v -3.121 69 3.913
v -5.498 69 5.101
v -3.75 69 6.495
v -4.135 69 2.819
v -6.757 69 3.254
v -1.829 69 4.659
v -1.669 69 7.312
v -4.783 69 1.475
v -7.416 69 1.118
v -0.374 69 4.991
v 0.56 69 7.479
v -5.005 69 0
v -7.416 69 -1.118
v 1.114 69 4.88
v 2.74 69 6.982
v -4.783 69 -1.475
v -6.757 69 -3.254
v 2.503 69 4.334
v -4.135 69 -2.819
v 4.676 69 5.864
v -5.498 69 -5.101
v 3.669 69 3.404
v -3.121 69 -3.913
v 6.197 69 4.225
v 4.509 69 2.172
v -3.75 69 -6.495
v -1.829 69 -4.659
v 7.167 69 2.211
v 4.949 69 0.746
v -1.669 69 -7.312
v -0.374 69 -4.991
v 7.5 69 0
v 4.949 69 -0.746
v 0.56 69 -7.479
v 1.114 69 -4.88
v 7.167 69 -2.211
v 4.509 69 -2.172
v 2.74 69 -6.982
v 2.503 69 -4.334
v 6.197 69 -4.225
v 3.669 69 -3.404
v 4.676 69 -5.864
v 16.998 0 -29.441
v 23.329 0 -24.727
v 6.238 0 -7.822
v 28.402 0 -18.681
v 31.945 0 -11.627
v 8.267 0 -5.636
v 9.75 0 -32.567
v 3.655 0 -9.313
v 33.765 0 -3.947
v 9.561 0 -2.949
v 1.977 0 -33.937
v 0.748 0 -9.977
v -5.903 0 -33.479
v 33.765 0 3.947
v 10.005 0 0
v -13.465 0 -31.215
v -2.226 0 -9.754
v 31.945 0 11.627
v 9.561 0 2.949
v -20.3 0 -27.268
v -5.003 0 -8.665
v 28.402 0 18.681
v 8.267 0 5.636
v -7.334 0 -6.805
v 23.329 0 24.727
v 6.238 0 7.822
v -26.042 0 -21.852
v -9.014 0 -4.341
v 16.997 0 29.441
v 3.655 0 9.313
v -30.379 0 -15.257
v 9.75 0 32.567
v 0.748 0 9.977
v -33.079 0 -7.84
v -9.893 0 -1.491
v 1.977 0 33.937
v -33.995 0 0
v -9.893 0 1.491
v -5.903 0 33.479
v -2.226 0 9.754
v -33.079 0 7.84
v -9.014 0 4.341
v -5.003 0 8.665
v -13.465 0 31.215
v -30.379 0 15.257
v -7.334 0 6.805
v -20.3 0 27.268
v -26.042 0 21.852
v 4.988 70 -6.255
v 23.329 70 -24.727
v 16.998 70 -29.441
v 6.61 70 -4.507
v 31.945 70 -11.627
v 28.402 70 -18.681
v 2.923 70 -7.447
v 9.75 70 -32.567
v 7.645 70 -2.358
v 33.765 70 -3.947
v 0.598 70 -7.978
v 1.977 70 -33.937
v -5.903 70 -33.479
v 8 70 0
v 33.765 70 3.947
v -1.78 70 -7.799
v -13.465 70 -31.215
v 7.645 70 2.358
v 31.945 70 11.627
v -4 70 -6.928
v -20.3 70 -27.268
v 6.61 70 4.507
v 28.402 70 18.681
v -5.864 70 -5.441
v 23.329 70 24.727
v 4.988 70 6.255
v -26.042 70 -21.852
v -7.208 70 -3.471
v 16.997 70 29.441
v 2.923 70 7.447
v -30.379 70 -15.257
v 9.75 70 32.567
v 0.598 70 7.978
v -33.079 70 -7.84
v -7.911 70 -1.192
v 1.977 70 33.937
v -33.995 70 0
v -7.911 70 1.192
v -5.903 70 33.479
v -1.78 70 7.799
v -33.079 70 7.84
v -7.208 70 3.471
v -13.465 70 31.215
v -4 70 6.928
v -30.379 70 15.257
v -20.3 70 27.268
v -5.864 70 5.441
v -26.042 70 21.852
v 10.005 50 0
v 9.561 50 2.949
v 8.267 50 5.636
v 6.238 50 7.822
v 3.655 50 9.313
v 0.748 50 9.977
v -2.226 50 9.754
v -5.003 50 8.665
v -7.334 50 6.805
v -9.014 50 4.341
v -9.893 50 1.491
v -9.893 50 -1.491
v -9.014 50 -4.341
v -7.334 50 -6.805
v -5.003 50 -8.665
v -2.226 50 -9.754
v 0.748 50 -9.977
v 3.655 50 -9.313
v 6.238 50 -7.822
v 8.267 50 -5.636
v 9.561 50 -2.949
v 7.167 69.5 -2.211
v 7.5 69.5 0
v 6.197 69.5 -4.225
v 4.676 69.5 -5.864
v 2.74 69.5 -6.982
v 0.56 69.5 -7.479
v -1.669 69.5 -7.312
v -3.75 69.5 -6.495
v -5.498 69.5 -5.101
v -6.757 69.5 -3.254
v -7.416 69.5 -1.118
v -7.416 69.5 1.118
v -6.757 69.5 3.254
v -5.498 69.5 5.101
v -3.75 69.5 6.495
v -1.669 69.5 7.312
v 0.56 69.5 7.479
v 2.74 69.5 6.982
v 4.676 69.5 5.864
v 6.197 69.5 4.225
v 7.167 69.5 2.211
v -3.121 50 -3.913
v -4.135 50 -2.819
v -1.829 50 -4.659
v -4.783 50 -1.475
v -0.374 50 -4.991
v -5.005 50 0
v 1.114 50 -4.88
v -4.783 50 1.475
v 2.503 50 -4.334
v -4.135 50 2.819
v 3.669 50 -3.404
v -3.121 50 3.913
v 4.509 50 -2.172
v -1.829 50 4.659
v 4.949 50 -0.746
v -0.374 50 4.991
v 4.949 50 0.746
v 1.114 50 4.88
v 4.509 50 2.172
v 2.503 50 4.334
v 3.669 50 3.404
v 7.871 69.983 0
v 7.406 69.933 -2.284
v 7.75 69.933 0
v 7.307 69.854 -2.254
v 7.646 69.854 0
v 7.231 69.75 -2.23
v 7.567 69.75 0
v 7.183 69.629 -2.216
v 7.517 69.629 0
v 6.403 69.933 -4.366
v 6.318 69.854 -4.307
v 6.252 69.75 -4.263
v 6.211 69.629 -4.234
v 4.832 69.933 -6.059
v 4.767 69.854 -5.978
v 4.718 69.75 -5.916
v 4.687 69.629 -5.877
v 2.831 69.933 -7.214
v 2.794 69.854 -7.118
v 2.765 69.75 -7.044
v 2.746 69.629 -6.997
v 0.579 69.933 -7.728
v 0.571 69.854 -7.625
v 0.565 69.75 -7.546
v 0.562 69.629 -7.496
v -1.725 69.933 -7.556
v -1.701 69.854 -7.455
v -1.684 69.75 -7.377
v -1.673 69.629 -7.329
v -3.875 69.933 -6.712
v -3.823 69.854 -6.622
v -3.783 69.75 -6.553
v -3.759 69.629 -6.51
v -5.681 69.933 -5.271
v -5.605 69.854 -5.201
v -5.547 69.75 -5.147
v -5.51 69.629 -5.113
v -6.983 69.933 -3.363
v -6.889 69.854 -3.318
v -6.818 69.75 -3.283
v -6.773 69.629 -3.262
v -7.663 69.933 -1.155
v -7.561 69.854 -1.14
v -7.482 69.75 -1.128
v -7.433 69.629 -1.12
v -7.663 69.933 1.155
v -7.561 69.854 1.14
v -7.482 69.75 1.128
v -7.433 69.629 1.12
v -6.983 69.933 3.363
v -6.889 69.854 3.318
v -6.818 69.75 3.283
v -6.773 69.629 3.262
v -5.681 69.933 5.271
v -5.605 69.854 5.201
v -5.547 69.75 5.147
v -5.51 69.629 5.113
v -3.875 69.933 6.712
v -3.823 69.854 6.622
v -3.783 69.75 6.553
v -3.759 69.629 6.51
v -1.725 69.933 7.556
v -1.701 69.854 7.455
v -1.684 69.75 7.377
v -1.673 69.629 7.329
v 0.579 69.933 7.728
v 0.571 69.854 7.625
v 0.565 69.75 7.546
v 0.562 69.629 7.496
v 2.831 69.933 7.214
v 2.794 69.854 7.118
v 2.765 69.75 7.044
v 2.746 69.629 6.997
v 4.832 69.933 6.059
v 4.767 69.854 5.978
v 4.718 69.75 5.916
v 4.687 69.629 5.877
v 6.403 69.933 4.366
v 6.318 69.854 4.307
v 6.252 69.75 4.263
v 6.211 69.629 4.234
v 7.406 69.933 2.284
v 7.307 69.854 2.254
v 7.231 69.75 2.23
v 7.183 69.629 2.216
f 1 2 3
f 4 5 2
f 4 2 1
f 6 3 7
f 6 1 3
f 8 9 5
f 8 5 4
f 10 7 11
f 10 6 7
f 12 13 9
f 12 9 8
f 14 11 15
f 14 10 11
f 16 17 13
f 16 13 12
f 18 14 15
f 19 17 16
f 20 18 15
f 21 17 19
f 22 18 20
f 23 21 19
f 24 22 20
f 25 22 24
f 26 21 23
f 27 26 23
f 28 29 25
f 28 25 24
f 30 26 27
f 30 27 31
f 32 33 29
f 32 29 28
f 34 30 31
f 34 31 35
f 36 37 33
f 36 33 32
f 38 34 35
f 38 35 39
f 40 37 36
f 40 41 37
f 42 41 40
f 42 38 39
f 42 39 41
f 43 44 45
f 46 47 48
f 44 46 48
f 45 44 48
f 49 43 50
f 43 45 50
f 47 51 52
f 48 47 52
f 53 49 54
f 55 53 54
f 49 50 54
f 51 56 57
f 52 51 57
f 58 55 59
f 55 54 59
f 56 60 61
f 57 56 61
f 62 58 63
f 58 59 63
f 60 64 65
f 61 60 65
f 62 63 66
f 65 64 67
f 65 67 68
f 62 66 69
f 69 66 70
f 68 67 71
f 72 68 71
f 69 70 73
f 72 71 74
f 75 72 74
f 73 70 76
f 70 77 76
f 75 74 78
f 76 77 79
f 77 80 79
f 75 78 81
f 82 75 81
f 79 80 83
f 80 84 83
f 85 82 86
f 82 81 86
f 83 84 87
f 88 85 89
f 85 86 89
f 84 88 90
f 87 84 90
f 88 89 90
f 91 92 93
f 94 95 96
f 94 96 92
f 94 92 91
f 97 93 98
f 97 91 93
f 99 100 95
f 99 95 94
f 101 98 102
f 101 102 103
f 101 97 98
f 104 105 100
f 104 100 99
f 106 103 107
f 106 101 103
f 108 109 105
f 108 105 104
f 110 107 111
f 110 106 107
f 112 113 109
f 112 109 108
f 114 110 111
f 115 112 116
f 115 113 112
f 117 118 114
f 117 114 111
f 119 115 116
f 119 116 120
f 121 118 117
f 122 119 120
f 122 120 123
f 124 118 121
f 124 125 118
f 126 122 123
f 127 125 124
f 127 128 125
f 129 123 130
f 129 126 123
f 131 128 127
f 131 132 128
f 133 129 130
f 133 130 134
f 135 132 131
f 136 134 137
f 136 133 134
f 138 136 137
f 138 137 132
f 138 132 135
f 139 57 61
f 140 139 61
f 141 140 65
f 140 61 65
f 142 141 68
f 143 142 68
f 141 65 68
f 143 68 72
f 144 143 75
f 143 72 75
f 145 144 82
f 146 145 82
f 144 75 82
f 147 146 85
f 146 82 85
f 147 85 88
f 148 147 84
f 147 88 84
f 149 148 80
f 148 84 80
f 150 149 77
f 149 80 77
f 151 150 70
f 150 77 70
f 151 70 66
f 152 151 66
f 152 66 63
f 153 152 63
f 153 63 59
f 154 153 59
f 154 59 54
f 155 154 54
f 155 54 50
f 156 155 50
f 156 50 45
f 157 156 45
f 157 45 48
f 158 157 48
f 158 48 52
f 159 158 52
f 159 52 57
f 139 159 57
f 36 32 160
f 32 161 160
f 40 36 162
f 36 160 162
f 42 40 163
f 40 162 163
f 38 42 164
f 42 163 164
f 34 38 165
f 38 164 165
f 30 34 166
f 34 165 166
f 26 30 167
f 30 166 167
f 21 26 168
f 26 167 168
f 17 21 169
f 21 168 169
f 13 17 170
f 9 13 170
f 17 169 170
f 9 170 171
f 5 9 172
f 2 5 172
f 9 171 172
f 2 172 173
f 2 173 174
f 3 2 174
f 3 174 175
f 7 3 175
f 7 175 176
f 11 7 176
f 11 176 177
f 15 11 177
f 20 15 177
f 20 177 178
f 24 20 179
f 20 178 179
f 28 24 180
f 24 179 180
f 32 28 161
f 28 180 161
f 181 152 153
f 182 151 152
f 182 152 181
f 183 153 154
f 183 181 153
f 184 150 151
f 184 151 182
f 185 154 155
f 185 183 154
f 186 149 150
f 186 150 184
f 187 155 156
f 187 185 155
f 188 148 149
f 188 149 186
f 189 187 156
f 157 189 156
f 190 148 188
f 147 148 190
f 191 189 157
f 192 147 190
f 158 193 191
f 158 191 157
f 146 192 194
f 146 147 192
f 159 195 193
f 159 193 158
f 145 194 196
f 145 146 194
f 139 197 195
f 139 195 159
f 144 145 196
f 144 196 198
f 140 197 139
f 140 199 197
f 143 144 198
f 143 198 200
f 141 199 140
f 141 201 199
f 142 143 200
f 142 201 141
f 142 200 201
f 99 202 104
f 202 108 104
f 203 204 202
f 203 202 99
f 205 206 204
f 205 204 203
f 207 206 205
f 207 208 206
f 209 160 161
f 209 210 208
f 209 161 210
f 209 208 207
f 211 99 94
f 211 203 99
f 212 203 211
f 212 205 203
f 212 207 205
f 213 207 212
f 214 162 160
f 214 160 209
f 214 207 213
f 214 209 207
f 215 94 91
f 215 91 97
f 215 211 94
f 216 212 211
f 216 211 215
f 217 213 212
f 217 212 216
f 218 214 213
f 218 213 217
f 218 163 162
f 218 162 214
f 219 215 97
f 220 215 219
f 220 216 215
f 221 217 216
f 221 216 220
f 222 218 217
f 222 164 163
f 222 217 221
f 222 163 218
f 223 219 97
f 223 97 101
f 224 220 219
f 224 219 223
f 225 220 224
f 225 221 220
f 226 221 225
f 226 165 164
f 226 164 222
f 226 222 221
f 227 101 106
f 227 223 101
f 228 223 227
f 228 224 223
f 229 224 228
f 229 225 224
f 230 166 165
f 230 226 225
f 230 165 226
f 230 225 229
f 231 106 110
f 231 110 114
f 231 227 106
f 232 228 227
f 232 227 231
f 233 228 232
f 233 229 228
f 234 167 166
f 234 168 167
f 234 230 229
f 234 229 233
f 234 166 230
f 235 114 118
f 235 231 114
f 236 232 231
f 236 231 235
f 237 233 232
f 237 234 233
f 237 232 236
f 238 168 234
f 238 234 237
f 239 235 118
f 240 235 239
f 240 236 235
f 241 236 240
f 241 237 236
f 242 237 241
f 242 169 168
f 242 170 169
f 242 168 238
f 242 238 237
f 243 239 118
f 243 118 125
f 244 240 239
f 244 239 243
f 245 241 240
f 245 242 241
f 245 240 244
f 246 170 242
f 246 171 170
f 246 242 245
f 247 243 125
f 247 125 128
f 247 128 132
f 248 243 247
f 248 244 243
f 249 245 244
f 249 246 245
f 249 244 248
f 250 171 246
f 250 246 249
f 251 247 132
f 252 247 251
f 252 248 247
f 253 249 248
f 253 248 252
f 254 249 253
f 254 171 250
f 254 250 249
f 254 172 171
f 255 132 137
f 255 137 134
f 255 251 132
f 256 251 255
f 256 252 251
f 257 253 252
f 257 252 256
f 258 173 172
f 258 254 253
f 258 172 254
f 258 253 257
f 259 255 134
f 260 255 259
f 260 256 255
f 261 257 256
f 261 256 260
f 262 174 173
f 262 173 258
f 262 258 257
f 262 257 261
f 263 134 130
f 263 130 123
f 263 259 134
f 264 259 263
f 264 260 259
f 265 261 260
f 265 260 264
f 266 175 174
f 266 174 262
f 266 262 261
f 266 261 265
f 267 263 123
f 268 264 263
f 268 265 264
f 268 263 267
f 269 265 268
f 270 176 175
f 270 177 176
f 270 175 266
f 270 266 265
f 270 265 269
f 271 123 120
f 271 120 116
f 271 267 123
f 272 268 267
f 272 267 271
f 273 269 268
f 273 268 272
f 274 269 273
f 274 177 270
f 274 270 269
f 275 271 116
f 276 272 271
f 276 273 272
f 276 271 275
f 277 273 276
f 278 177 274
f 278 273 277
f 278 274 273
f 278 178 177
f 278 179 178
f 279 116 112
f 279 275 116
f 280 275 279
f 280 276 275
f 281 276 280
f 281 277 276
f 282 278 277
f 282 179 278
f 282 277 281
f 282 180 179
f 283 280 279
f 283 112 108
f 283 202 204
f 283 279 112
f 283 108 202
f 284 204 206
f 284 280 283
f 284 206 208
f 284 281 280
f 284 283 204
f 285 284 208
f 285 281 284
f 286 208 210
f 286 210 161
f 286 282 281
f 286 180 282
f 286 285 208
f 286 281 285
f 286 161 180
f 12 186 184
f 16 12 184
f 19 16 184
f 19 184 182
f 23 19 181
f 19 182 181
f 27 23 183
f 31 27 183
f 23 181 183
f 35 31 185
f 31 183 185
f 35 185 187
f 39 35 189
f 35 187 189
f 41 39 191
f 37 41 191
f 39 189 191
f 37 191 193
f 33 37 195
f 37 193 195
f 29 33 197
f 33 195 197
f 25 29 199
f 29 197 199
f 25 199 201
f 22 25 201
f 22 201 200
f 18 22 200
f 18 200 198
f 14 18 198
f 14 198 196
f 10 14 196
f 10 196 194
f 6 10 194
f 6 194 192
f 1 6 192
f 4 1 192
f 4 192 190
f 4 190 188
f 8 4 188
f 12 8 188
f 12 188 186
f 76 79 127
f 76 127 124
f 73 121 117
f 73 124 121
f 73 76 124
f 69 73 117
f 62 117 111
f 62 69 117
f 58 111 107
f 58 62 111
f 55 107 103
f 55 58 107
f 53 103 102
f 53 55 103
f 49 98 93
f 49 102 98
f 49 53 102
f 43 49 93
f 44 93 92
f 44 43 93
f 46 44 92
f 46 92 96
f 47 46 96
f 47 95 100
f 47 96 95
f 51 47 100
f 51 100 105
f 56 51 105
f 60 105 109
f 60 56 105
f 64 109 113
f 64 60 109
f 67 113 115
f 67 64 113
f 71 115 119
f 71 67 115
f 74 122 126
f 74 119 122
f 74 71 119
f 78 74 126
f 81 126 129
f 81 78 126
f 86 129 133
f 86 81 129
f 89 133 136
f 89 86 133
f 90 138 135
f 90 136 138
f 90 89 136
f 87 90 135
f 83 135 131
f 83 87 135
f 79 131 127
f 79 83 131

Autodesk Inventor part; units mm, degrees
ref_plane "YZ Plane" through (0, 0, 0) normal (1, 0, 0) x (0, 1, 0)
ref_plane "XZ Plane" through (0, 0, 0) normal (0, 1, 0) x (-1, 0, 0)
ref_plane "XY Plane" through (0, 0, 0) normal (0, 0, 1) x (1, 0, 0)
sketch "Sketch1" plane through (0, 0, 0) normal (0, 1, 0) x (-1, 0, 0)
  circle A0 centre (0, 0) radius 33.995
  circle A1 centre (0, 0) radius 5.005
  dimension "d0" = 67.99
  dimension "d1" = 10.01
extrude "Extrusion1" add sketch "Sketch1" along normal blind 70
sketch "Sketch2" plane through (0, 0, 0) normal (0, -1, 0) x (1, 0, 0)
  circle A0 centre (0, 0) radius 5.005 projected
  circle A1 centre (0, 0) radius 10.005
  dimension "d4" = 20.01
extrude "Extrusion2" cut sketch "Sketch2" against normal blind 50
sketch "Sketch3" plane through (0, 70, 0) normal (0, 1, 0) x (1, 0, 0)
  circle A0 centre (0, 0) radius 7.5
  dimension "d7" = 15
extrude "Extrusion3" cut sketch "Sketch3" against normal blind 1
fillet "Fillet1" radius 0.5 1 edges at (-7.5, 70, 0)
properties part number "top" material "Steel, Mild"
